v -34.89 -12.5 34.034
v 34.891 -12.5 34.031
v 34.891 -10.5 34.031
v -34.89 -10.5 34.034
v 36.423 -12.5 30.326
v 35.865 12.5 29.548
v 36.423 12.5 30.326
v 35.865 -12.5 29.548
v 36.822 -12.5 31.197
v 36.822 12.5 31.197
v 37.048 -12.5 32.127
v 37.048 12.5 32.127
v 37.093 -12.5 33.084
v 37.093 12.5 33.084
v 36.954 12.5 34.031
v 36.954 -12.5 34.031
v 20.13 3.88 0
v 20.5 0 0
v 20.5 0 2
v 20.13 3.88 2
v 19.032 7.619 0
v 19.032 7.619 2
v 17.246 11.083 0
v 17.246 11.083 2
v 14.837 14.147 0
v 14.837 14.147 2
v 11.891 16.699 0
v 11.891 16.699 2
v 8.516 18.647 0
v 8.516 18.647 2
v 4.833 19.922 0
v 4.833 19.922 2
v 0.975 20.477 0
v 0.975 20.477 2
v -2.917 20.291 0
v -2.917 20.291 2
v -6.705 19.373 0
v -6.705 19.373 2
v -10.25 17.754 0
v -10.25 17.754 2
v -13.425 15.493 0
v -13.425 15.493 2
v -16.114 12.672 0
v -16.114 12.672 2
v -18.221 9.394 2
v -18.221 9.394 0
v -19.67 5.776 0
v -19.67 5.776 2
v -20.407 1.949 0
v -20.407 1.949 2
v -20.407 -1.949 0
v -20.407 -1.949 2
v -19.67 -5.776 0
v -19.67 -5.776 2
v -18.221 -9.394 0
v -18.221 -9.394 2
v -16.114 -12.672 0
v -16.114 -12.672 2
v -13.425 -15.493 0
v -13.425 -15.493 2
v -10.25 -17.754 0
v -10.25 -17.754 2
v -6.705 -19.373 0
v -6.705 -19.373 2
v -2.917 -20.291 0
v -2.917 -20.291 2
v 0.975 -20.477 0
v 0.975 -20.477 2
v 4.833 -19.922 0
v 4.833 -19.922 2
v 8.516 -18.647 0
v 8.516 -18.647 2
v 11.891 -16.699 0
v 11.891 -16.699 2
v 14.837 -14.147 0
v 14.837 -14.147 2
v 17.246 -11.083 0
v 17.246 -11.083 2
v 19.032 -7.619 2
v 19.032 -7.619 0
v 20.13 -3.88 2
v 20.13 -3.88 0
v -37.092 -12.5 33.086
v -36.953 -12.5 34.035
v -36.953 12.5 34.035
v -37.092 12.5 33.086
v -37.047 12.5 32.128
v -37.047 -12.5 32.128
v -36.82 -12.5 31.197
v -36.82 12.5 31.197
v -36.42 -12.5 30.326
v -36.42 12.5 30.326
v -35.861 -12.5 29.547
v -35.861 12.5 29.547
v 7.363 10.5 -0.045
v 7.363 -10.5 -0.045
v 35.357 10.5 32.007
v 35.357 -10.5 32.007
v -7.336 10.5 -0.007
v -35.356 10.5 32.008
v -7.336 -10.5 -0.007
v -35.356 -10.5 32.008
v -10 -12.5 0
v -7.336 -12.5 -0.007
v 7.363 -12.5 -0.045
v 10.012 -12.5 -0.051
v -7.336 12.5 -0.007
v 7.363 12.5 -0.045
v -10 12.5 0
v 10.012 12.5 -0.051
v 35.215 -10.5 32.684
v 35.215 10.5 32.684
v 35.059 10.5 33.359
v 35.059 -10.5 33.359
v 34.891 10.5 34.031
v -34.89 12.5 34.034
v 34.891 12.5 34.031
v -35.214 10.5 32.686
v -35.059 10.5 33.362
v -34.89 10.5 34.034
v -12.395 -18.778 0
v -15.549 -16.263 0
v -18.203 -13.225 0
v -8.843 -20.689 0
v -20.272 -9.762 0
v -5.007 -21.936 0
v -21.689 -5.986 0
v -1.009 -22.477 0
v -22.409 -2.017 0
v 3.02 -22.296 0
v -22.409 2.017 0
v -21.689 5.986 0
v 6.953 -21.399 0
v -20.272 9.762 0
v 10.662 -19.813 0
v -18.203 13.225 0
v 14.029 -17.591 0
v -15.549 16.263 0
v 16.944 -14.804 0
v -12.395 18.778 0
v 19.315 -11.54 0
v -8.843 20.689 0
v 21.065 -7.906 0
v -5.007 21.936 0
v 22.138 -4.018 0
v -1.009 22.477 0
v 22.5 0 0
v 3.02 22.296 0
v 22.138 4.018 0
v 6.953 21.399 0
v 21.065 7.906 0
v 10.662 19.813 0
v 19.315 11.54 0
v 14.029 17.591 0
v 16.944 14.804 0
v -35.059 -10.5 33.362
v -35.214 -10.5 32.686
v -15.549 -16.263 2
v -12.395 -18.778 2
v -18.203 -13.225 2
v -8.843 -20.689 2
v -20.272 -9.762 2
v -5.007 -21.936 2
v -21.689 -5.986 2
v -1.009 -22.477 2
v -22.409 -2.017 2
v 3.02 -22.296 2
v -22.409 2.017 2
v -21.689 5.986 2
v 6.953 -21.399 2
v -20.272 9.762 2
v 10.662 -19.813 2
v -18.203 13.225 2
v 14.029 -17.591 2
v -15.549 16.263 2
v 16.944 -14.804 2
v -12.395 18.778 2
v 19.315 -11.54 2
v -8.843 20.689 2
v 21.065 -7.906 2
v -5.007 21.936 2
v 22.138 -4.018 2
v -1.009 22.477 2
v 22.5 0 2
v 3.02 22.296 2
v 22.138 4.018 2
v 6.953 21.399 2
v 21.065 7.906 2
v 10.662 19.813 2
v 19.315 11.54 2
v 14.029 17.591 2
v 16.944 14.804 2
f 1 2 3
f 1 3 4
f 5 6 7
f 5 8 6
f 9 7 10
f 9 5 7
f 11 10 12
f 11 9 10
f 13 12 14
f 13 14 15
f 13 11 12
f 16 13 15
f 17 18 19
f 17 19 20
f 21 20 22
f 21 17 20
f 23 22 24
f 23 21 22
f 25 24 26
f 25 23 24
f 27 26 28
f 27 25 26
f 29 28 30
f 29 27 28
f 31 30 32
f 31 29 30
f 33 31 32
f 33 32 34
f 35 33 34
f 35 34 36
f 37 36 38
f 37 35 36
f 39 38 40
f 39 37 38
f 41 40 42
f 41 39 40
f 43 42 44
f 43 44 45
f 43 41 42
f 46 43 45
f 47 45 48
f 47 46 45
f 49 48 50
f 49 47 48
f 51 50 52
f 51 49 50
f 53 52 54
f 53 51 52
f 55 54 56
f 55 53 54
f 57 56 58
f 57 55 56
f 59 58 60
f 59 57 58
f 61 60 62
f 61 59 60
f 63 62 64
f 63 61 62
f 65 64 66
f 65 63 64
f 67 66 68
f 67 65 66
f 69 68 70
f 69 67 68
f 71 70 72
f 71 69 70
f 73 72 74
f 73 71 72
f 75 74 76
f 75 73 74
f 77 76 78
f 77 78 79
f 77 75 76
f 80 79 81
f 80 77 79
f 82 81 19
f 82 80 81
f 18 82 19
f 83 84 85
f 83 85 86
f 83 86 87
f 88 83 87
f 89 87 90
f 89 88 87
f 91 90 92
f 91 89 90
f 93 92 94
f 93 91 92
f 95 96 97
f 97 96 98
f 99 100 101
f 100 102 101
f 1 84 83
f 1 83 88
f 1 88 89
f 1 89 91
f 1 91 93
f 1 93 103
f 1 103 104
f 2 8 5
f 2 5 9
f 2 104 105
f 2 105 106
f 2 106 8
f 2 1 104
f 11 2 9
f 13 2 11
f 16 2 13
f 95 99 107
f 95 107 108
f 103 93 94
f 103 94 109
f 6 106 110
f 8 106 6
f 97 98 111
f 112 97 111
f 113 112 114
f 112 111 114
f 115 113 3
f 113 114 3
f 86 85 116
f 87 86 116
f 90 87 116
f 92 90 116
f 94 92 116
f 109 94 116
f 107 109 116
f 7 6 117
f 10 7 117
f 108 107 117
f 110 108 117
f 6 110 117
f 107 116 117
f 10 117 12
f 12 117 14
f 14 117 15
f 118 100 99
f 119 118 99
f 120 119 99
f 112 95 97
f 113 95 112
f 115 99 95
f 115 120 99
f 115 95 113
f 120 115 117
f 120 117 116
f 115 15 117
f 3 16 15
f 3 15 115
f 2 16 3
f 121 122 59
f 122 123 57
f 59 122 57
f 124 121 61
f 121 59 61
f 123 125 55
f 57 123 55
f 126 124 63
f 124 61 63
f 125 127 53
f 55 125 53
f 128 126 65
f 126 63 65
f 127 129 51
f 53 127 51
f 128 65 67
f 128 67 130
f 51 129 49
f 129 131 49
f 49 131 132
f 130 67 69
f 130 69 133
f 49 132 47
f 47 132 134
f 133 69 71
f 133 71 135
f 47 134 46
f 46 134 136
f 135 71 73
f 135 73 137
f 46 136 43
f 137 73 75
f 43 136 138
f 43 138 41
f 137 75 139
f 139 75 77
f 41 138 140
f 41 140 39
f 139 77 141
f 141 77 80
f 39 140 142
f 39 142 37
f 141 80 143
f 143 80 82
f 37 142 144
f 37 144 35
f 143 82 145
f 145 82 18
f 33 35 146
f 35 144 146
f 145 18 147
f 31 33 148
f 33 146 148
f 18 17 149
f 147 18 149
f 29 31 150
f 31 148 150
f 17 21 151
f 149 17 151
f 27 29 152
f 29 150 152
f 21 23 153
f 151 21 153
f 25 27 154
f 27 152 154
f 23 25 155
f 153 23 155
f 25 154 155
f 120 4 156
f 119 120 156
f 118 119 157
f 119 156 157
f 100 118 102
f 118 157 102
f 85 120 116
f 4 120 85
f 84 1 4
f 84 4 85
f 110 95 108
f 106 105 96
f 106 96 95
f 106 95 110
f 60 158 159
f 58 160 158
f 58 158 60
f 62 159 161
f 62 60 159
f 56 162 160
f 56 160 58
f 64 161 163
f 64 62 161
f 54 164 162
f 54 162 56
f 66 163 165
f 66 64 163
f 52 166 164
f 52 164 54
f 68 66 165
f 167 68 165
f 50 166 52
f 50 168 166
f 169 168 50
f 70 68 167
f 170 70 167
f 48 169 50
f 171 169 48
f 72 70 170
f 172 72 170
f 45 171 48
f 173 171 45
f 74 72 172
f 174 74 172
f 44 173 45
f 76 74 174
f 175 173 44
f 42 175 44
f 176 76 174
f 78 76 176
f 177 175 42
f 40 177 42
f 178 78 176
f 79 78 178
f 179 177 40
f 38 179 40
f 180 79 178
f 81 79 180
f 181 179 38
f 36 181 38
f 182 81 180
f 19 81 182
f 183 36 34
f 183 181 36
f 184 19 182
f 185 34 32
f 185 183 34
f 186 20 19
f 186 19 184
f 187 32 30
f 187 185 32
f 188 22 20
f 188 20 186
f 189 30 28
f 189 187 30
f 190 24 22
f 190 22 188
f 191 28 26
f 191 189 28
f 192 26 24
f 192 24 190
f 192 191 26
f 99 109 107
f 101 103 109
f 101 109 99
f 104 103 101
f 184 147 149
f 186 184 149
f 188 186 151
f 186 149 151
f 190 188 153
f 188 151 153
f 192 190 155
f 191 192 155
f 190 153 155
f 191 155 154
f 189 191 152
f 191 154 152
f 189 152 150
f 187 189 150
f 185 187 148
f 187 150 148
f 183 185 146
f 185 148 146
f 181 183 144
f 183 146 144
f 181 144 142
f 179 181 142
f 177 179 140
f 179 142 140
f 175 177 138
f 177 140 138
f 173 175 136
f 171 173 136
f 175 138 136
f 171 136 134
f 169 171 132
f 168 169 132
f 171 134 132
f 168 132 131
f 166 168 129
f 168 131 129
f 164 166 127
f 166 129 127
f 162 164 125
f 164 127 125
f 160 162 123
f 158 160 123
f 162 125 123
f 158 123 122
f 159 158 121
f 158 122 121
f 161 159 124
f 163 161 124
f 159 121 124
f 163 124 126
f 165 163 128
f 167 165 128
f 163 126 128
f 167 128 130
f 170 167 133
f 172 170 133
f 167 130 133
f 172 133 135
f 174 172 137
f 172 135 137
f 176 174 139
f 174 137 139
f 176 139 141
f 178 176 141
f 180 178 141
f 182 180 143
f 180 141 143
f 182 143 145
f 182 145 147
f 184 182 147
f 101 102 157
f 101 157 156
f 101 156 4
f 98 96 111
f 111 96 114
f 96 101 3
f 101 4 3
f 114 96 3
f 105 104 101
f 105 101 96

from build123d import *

# Parameters (mm, degrees)
F0_R     = 22.5
F0_R_2   = 20.5
F1_DEPTH = 2
F3_DEPTH = 12.5
F4_DEPTH = 10.5


with BuildPart() as f1:
    # F0 (on Top) → F1 (new body)
    with BuildSketch(Plane.XY):
        Circle(F0_R)
        Circle(F0_R_2, mode=Mode.SUBTRACT)
    extrude(amount=F1_DEPTH)


with BuildPart() as f3:
    # F2 (on Front) → F3 (new body, symmetric)
    with BuildSketch(Plane.XZ):
        with BuildLine():
            ThreePointArc((35.8647954681, 29.5480771848), (36.9575138291, 31.6563697), (36.9543489902, 34.0310108793))
            Line((36.9543489902, 34.0310108793), (35.3566579925, 32.0066029077))
            Line((35.3566579925, 32.0066029077), (7.3626854021, -0.0445880533))
            Line((7.3626854021, -0.0445880533), (10.0121919702, -0.0513920895))
            Line((10.0121919702, -0.0513920895), (35.8647954681, 29.5480771848))
        make_face()
        with BuildLine():
            Line((35.3566579925, 32.0066029077), (36.9543489902, 34.0310108793))
            Line((36.9543489902, 34.0310108793), (34.8912937434, 34.031108467))
            ThreePointArc((34.8912937434, 34.031108467), (35.1385591119, 33.022207874), (35.3566579925, 32.0066029077))
        make_face()
        with BuildLine():
            Line((7.3626854021, -0.0445880533), (35.3566579925, 32.0066029077))
            ThreePointArc((35.3566579925, 32.0066029077), (35.1385591119, 33.022207874), (34.8912937434, 34.031108467))
            Line((34.8912937434, 34.031108467), (-34.8904340011, 34.0344093193))
            ThreePointArc((-34.8904340011, 34.0344093193), (-35.1380360371, 33.0244831042), (-35.3564115486, 32.0078367231))
            Line((-35.3564115486, 32.0078367231), (-7.3361719456, -0.0068408143))
            Line((-7.3361719456, -0.0068408143), (7.3626854021, -0.0445880533))
        make_face()
        with BuildLine():
            Line((-35.3564115486, 32.0078367231), (-36.953489248, 34.0345069071))
            ThreePointArc((-36.953489248, 34.0345069071), (-36.9562144908, 31.6571352246), (-35.8606602894, 29.5472384177))
            Line((-35.8606602894, 29.5472384177), (-10, 0))
            Line((-10, 0), (-7.3361719456, -0.0068408143))
            Line((-7.3361719456, -0.0068408143), (-35.3564115486, 32.0078367231))
        make_face()
        with BuildLine():
            Line((-34.8904340011, 34.0344093193), (-36.953489248, 34.0345069071))
            Line((-36.953489248, 34.0345069071), (-35.3564115486, 32.0078367231))
            ThreePointArc((-35.3564115486, 32.0078367231), (-35.1380360371, 33.0244831042), (-34.8904340011, 34.0344093193))
        make_face()
    extrude(amount=F3_DEPTH, both=True)

    # F2 (on Front) → F4 (cut, symmetric)
    with BuildSketch(Plane.XZ):
        with BuildLine():
            ThreePointArc((8.42e-08, 63), (23.4777886852, 54.8945488781), (36.9543489902, 34.0310108793))
            Line((36.9543489902, 34.0310108793), (36.9557192967, 63))
            Line((36.9557192967, 63), (8.42e-08, 63))
        make_face()
        with BuildLine():
            Line((7.3626854021, -0.0445880533), (35.3566579925, 32.0066029077))
            ThreePointArc((35.3566579925, 32.0066029077), (35.1385591119, 33.022207874), (34.8912937434, 34.031108467))
            Line((34.8912937434, 34.031108467), (-34.8904340011, 34.0344093193))
            ThreePointArc((-34.8904340011, 34.0344093193), (-35.1380360371, 33.0244831042), (-35.3564115486, 32.0078367231))
            Line((-35.3564115486, 32.0078367231), (-7.3361719456, -0.0068408143))
            Line((-7.3361719456, -0.0068408143), (7.3626854021, -0.0445880533))
        make_face()
    extrude(amount=F4_DEPTH, both=True, mode=Mode.SUBTRACT)


solid = Compound([f1.part, f3.part])
